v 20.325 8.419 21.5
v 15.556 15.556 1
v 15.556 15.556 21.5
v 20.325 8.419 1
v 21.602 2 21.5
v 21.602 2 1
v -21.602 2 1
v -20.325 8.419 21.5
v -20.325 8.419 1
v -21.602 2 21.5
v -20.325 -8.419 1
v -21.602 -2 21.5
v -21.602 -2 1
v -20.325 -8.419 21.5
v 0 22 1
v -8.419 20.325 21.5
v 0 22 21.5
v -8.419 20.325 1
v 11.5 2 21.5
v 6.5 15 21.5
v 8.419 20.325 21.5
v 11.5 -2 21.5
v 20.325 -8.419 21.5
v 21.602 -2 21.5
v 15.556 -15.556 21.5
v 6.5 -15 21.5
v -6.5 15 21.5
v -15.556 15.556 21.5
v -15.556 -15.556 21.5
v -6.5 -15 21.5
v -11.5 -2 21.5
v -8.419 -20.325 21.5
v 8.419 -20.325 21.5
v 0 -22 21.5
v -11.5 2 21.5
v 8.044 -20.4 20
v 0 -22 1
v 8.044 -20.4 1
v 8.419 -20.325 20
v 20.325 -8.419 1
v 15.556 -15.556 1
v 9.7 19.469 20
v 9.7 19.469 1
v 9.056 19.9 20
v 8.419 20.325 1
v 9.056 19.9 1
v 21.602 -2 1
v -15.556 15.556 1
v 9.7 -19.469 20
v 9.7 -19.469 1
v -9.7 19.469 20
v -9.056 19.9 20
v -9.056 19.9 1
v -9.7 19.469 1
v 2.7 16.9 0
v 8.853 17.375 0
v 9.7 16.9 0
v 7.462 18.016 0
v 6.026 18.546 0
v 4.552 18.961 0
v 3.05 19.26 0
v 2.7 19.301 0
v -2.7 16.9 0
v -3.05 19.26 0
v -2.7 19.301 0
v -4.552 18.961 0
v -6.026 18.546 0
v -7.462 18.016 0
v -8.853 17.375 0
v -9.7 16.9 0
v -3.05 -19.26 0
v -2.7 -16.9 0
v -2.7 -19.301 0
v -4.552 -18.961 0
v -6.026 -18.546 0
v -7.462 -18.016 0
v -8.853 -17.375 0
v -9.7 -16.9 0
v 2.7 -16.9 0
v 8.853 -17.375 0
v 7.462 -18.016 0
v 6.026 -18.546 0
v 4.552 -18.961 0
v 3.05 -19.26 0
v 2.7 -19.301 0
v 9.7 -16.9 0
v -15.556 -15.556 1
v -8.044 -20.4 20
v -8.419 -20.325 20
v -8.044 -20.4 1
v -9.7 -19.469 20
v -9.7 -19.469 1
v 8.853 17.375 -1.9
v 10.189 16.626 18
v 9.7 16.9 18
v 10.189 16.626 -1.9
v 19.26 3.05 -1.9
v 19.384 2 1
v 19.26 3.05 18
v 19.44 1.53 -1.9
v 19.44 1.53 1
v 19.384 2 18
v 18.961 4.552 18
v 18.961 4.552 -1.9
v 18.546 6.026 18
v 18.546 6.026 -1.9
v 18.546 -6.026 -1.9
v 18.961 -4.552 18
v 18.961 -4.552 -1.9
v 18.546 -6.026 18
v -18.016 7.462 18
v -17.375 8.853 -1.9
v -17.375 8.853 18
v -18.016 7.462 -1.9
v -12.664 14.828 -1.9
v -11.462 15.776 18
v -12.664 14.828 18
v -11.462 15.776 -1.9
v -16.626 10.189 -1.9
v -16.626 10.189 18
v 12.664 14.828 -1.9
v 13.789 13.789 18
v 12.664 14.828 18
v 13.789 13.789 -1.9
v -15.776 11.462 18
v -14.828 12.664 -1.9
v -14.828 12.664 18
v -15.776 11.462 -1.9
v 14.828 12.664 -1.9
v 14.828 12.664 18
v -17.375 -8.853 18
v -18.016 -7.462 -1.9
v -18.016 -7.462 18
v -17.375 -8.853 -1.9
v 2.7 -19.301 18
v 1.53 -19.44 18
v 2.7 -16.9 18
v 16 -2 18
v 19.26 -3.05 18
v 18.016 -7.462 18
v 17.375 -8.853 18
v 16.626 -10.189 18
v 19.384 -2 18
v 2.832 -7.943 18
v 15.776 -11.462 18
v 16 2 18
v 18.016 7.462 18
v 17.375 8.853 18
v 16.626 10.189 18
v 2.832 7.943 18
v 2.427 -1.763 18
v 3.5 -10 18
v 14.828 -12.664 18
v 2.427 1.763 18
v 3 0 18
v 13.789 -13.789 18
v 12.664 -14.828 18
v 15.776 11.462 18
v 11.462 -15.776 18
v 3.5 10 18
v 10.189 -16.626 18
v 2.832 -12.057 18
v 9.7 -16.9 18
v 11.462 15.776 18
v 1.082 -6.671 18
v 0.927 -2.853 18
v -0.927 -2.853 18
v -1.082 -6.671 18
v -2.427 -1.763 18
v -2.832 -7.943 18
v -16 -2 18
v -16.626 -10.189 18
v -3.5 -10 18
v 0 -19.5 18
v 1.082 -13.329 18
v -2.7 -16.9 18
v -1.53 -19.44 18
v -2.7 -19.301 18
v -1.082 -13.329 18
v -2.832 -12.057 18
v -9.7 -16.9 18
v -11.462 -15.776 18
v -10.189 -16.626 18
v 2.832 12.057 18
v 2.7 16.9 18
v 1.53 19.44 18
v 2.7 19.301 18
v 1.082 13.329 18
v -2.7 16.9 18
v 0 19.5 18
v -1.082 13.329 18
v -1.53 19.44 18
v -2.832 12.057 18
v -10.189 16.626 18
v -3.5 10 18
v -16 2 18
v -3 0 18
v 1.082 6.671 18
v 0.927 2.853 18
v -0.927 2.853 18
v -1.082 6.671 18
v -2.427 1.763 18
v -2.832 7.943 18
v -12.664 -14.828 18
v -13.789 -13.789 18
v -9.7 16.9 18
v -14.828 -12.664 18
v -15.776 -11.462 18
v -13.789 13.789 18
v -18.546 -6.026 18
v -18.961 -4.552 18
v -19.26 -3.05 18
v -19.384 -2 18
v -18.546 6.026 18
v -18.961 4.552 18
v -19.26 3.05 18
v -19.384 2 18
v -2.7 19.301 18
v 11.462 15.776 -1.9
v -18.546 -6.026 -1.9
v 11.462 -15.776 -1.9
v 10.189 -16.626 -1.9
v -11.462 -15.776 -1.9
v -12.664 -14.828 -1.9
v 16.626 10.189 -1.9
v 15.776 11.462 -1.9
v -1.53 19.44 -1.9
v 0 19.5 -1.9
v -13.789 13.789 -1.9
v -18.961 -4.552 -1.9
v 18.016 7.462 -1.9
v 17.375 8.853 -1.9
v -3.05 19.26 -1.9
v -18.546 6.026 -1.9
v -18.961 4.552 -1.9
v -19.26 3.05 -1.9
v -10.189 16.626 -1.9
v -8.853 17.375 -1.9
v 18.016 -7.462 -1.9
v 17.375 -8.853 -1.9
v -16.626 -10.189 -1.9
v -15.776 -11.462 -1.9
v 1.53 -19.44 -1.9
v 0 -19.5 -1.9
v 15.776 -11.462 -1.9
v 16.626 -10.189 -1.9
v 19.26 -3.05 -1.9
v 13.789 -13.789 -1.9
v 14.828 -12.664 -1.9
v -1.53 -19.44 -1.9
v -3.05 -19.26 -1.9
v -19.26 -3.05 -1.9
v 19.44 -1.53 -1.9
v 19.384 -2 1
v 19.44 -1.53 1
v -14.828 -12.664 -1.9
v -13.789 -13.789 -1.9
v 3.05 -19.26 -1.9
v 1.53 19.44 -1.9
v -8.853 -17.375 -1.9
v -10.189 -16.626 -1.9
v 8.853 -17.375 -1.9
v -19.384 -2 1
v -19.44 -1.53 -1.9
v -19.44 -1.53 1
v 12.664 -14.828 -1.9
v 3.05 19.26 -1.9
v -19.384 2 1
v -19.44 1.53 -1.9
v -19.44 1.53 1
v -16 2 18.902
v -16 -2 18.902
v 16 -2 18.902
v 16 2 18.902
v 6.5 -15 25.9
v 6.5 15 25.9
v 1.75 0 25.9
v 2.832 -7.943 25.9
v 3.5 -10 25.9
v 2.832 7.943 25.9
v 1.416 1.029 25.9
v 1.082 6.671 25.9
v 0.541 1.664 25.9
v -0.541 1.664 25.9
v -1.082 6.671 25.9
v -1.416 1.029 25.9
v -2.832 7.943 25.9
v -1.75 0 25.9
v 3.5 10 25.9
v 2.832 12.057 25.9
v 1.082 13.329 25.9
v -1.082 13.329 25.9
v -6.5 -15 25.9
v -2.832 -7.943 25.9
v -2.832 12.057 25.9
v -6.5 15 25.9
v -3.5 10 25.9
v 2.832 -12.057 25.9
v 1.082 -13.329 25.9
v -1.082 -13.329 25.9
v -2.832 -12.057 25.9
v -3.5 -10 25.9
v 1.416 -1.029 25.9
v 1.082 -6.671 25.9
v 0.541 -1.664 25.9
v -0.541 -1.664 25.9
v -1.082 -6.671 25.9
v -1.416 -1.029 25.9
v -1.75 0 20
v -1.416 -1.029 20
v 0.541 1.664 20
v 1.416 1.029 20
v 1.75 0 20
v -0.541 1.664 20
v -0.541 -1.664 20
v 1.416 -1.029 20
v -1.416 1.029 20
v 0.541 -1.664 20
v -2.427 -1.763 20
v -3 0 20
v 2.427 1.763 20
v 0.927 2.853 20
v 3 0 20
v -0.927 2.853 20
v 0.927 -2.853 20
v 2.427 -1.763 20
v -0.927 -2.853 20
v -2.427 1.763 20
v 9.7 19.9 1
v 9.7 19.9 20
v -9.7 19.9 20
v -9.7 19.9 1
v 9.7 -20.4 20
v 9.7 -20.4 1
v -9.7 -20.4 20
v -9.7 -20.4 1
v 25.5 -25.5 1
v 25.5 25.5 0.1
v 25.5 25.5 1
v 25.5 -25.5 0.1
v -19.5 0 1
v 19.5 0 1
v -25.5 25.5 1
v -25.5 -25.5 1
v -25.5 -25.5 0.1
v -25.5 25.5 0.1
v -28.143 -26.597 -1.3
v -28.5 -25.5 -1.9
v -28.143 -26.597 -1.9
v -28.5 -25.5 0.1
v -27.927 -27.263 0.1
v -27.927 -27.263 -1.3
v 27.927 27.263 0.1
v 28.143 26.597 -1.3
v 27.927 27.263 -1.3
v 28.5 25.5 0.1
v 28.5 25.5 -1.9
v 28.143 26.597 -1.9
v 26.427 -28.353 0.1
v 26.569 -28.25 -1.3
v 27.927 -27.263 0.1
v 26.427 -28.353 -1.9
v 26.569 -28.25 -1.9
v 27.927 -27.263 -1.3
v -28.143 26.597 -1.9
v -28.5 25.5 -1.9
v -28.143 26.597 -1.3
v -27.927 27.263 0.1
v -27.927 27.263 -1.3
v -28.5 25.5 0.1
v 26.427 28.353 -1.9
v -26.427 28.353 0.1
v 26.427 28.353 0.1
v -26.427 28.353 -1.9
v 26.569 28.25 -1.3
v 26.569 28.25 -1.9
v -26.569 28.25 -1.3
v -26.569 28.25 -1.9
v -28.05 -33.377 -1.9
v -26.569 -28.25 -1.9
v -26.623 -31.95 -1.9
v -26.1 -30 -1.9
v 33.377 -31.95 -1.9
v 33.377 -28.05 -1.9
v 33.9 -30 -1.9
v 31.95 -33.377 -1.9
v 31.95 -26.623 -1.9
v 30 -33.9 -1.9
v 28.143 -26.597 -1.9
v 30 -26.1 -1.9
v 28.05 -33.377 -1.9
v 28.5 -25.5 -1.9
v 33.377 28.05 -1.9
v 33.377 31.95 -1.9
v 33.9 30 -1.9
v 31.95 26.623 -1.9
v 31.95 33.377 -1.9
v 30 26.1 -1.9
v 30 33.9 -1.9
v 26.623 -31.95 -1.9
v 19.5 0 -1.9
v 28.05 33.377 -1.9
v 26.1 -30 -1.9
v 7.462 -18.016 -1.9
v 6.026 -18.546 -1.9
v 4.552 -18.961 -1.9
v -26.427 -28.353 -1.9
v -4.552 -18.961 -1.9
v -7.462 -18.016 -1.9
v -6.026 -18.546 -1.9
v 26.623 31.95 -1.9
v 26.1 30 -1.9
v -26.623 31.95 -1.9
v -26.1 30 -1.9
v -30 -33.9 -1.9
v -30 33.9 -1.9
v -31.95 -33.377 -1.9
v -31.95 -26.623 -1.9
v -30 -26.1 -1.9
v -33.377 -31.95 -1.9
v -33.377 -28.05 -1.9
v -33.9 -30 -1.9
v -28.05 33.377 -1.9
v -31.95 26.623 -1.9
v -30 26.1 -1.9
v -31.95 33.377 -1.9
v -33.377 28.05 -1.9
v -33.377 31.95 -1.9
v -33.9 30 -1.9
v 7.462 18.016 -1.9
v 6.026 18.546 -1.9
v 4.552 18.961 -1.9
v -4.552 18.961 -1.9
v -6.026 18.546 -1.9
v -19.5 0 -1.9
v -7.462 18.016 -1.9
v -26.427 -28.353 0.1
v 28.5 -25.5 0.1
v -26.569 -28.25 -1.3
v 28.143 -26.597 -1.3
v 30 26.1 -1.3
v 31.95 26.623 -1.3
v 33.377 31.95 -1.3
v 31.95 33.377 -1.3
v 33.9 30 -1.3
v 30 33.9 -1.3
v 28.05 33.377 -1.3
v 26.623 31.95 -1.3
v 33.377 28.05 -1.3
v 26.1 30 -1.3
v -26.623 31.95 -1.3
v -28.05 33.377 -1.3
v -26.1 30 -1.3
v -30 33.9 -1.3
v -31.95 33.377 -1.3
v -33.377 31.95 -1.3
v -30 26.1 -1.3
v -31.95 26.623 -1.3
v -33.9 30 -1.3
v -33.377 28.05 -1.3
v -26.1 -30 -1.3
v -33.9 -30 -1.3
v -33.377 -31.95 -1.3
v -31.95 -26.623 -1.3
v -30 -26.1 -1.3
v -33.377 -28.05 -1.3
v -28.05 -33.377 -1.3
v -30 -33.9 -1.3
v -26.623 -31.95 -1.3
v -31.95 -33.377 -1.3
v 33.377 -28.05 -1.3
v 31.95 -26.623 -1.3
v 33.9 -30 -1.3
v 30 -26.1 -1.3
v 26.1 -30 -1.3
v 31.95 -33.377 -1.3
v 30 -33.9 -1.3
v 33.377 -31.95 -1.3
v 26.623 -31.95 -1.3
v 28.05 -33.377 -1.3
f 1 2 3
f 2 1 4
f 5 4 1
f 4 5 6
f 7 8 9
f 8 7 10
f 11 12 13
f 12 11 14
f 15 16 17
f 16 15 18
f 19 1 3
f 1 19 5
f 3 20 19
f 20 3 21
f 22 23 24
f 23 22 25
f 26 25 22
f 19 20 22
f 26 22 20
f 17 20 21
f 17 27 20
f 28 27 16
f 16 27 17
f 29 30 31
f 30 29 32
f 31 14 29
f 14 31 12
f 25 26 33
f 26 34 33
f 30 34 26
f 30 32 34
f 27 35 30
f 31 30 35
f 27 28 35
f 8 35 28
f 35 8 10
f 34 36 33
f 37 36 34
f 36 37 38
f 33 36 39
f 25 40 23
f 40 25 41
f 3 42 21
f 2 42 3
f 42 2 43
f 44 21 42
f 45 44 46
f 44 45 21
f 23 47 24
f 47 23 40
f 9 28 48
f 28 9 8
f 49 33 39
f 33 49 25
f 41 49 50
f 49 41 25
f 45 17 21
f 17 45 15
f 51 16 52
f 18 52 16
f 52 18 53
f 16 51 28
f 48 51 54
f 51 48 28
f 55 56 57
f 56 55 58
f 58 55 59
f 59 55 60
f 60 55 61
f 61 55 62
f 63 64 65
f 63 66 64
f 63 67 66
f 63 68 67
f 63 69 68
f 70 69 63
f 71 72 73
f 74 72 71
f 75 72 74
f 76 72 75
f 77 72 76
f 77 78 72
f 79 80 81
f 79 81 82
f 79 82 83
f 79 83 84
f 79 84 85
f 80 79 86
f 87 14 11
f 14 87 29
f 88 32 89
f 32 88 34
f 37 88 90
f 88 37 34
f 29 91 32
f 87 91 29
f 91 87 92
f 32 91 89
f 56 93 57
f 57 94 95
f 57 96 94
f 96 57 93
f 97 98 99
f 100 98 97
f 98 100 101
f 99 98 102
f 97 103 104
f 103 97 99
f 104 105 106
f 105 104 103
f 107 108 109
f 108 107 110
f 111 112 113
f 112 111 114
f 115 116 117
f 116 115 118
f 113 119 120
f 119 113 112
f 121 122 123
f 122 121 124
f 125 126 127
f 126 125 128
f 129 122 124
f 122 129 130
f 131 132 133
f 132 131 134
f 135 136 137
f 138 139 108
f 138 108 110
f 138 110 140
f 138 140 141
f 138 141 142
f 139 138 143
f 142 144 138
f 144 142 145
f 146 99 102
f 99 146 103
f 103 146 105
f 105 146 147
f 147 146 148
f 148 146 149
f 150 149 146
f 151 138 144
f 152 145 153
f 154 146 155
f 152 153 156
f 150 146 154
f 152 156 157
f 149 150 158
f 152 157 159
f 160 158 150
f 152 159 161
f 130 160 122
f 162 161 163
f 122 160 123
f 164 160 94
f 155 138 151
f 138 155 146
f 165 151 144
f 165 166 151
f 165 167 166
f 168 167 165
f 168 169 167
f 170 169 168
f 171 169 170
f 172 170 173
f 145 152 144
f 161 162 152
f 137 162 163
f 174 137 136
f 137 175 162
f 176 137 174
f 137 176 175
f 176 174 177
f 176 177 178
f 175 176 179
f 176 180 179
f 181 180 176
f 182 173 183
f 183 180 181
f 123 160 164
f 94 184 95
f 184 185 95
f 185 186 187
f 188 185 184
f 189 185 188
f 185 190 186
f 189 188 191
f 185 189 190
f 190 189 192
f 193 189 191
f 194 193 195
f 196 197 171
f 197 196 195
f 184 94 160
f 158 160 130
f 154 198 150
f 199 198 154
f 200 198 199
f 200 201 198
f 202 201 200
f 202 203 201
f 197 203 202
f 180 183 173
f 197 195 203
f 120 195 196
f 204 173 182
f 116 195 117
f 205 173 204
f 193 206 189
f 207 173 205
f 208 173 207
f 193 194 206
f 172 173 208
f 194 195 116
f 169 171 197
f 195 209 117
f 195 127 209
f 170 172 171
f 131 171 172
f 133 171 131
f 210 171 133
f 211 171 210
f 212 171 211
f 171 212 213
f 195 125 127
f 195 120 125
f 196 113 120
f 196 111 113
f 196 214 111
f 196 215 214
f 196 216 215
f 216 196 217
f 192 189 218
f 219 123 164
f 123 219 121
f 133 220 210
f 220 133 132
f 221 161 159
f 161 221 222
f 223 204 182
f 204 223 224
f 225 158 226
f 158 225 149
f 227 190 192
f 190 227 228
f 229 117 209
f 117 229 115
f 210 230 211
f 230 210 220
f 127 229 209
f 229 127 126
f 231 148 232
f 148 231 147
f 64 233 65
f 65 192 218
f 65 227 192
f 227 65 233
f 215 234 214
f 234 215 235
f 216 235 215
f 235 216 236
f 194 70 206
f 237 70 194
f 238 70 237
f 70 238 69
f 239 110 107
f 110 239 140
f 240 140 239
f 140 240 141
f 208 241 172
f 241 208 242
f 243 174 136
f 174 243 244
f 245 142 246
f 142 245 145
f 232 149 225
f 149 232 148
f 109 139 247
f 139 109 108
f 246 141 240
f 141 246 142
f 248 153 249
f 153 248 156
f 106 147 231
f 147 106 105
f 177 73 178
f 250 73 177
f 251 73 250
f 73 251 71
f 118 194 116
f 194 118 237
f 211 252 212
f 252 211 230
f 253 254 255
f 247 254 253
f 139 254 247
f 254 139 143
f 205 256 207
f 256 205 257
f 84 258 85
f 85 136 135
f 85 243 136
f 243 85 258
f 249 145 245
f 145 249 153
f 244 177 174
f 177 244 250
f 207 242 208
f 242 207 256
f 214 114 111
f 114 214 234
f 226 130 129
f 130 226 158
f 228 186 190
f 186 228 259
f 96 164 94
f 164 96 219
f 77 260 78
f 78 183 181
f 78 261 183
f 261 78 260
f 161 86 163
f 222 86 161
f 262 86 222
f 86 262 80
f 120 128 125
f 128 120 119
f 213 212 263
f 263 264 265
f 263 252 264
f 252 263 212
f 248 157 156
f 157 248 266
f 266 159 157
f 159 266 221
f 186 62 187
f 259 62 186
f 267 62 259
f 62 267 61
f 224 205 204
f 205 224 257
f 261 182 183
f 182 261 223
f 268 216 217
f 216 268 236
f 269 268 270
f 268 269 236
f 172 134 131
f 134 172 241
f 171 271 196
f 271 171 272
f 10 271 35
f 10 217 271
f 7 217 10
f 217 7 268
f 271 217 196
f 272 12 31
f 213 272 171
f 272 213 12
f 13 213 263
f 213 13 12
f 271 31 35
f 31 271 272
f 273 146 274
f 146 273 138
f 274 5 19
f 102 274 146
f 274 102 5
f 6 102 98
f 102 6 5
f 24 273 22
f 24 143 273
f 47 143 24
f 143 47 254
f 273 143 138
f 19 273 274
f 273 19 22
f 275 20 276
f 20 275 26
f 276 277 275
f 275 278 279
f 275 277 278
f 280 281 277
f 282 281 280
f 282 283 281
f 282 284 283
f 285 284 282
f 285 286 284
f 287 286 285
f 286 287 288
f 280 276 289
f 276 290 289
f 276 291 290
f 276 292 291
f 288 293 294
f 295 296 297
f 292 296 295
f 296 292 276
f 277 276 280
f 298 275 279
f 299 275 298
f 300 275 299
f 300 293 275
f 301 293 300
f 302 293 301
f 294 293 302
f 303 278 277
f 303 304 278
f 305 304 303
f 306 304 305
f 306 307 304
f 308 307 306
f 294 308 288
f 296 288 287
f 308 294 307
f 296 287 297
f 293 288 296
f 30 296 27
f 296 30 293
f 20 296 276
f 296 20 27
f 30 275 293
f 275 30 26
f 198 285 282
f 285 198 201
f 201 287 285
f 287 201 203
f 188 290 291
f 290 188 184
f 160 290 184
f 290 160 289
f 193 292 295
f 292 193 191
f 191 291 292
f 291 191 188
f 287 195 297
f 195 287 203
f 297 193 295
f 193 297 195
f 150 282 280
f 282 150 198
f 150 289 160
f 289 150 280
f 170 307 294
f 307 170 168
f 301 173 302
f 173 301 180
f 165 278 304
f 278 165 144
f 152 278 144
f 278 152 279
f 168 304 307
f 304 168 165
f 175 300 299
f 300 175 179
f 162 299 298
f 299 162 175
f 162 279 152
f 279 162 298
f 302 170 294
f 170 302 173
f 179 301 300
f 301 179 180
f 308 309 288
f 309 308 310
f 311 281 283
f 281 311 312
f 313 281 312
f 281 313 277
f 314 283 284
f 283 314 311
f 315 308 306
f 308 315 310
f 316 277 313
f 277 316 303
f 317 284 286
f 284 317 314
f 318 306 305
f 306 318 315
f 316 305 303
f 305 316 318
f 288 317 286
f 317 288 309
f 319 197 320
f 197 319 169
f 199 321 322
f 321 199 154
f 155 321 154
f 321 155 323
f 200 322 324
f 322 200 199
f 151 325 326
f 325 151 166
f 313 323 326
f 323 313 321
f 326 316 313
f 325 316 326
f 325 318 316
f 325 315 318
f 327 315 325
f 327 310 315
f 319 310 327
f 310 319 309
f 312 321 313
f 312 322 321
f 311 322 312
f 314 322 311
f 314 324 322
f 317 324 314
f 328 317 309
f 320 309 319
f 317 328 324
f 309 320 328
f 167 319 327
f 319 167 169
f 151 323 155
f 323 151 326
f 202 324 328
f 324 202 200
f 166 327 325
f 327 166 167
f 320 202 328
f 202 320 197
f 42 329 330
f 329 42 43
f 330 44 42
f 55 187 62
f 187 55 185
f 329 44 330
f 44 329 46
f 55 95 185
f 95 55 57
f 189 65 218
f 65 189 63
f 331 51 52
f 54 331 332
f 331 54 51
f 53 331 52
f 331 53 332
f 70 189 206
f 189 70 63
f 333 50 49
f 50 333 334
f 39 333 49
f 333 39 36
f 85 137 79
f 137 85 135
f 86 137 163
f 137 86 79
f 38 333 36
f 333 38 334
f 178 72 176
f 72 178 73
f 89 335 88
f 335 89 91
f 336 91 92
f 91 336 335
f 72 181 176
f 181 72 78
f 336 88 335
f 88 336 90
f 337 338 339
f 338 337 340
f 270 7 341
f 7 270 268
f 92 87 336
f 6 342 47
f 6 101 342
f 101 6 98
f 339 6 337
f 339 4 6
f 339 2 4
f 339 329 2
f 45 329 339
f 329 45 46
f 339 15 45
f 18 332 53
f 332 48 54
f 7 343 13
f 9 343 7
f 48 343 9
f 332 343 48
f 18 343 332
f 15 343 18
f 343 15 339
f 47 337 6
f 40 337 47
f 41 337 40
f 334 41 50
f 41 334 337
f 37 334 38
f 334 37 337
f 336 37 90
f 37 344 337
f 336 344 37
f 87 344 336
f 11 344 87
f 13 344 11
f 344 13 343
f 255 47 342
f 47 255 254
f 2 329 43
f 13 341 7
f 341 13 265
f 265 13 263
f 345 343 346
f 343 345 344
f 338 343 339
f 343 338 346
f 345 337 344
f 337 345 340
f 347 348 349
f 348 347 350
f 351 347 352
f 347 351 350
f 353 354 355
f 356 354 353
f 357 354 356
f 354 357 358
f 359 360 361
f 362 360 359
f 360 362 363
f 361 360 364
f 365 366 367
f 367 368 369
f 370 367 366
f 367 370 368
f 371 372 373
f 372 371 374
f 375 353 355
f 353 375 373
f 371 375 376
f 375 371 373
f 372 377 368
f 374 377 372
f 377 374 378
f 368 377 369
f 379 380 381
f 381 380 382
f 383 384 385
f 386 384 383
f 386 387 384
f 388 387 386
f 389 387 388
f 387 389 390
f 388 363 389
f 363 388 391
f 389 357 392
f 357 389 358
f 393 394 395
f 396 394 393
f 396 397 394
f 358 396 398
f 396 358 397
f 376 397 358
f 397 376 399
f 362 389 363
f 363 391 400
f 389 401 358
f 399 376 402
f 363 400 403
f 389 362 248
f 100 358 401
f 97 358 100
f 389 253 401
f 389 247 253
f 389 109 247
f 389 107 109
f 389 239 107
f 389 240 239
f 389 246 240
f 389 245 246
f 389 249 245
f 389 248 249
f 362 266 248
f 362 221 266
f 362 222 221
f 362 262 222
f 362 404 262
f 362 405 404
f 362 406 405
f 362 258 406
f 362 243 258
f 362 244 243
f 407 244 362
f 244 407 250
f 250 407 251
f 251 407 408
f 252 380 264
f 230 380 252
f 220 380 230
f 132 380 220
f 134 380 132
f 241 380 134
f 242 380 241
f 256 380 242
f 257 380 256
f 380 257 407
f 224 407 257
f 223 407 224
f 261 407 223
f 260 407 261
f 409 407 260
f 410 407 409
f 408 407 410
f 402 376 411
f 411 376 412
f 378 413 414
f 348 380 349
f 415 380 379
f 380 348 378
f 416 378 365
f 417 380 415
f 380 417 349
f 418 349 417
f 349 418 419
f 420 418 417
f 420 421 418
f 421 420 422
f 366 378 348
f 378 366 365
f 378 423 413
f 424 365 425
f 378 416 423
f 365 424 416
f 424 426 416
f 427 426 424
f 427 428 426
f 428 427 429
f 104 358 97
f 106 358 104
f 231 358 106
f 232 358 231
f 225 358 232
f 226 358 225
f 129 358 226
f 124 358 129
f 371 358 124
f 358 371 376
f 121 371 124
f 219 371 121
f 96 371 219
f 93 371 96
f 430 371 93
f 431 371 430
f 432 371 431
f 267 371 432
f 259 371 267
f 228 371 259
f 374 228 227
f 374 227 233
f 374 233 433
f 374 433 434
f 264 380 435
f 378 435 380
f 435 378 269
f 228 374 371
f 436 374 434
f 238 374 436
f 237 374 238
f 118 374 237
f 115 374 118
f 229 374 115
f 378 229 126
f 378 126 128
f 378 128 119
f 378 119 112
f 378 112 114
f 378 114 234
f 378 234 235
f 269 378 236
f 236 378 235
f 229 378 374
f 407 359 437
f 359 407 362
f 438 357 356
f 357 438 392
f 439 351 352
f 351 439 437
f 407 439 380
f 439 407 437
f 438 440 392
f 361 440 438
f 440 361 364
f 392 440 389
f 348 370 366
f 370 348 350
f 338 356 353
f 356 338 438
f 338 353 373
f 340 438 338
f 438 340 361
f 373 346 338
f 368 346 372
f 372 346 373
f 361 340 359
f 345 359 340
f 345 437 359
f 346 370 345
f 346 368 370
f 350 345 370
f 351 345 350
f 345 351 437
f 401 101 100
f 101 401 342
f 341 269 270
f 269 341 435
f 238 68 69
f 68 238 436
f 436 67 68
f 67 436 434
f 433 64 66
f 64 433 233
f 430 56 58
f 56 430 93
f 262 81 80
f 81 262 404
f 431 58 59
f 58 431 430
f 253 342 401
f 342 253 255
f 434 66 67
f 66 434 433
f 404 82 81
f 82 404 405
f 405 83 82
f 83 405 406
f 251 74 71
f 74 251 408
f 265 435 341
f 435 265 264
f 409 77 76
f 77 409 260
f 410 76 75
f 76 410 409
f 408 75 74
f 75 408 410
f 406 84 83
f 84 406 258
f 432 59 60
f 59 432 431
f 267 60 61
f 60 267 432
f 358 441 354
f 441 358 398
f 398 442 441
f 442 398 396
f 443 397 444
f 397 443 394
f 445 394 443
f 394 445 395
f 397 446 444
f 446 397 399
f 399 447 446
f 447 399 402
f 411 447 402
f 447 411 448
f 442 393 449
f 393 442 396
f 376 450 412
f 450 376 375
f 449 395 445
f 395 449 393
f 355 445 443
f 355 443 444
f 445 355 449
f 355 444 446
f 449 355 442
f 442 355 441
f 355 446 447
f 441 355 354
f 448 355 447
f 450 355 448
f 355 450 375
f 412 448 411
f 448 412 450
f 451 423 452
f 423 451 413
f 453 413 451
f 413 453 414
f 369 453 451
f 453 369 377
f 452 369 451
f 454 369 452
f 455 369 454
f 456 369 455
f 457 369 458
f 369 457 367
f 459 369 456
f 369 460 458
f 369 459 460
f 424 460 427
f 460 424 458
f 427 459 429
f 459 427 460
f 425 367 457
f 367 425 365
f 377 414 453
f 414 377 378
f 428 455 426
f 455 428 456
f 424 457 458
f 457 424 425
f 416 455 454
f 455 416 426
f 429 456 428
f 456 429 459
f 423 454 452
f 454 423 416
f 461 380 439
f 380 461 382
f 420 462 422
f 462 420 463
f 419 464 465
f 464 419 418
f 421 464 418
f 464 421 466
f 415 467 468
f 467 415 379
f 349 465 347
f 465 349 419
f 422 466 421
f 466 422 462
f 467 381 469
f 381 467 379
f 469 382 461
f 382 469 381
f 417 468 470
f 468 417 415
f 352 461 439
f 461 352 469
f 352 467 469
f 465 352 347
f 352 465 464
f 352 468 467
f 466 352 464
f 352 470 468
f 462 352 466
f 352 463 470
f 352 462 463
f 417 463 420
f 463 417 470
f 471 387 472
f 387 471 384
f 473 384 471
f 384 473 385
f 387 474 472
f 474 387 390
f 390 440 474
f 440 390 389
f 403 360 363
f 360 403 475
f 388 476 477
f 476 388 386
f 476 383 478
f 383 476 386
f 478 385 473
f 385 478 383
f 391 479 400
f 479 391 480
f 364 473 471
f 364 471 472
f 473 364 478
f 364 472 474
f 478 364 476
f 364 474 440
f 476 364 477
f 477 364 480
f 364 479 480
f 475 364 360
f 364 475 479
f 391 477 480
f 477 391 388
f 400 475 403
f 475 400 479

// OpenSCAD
rotate([0,0,0]){
difference(){
        union(){
                translate([-6.5,-15,20.9]) //REFUERZO RECTANGULAR SUPERIOR
                        cube([13,30,5]);
                difference(){ 
	                difference(){ //CUERPO CIRCULAR
		                translate([0,0,0])
			                cylinder(r=44/2, $fn=16, h=21.5);
		                translate([0,0,-1])
			                cylinder(r=39/2, $fn=80, h=19);
	                }
                        
	                color([1,1,1]){ //CORTES LATERALES TOMA TIERRA
		                translate([-22,-2,-1])
			                cube([6,4,30]);
		                translate([-19,2,21.5])
			                rotate([90,0,0])
				                cylinder(r=15/2, $fn=3, h=4);

		                translate([16,-2,-1])
			                cube([6,4,30]);
		                translate([19,-2,21.5])
			                rotate([90,0,180])
				                cylinder(r=15/2, $fn=3, h=4);
	                }
                }
        }
        // PERFORACIONES CENTRALES
        translate([0,10,0])
                cylinder(r=7/2, $fn=10, h=40);
        translate([0,-10,0])
                cylinder(r=7/2, $fn=10, h=40);
        translate([0,0,0])
                cylinder(r=3.5/2, $fn=10, h=40);
        translate([0,0,0])
                cylinder(r=6/2, $fn=10, h=20);
}
//PESTAÑAS INTERNAS LATERALES
translate([5.4/2,16.9,0]) 
        cube([7,3,20]);
translate([-5.4/2-7,16.9,0])
        cube([7,3,20]);
translate([5.4/2,-20.4,0])
        cube([7,3.5,20]);
translate([-5.4/2-7,-20.4,0])
        cube([7,3.5,20]);

}

difference(){ //FRONTAL
        union(){
                translate([-25.5,-25.5,0])
	                cube([51,51,1]);
                hull(){
	                translate([-25.5,-25.5,-1.9])
		                cylinder(r=3, $fn=10, h=2);
	                translate([+25.5,-25.5,-1.9])
		                cylinder(r=3, $fn=10, h=2);
	                translate([-25.5,+25.5,-1.9])
		                cylinder(r=3, $fn=10, h=2);
	                translate([+25.5,+25.5,-1.9])
		                cylinder(r=3, $fn=10, h=2);
                }
        }
        translate([0,0,-4])
	        cylinder(r=39/2, $fn=80, h=19);
}


// CIRCULOS DE LAS ESQUINAS PARA QUE ESTAS NO SE LEVANTEN EN IMPRESION CON ABS
translate([30,30,-1.90])
	cylinder(r=7.8/2, $fn=12, h=0.6);
translate([-30,30,-1.90])
	cylinder(r=7.8/2, $fn=12, h=0.6);
translate([-30,-30,-1.90])
	cylinder(r=7.8/2, $fn=12, h=0.6);
translate([30,-30,-1.90])
	cylinder(r=7.8/2, $fn=12, h=0.6);
